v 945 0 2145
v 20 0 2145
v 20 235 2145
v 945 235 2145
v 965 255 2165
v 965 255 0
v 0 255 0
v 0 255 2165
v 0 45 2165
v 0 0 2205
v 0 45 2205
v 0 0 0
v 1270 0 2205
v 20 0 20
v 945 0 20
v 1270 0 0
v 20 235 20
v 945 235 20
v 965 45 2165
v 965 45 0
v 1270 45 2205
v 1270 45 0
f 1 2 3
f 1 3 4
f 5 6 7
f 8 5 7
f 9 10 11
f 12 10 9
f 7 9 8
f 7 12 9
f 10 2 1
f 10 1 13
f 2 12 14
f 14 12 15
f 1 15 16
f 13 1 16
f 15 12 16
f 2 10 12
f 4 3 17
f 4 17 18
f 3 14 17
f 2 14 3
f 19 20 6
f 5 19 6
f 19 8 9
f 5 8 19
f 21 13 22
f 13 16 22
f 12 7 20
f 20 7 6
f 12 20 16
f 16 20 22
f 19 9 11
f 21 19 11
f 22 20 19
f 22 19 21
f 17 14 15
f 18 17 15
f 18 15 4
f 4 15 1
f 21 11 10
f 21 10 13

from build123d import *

# Parameters (mm, degrees)
F1_DEPTH = 2165
F2_W     = 1270
F2_H     = 45
F3_DEPTH = 40
F4_W     = 925
F4_H     = 2125
F5_DEPTH = 235


with BuildPart() as f1:
    # F0 (on Top) → F1 (new body)
    with BuildSketch(Plane.XY):
        Polygon((0, 255), (0, 0), (1270, 0), (1270, 45), (965, 45), (965, 255), align=None)
    extrude(amount=F1_DEPTH)

    # F2 (on face) → F3 (join)
    with BuildSketch(Plane.XY.offset(2165)):
        with Locations((635, 22.5)):
            Rectangle(F2_W, F2_H)
    extrude(amount=F3_DEPTH)

    # F4 (on face) → F5 (cut)
    with BuildSketch(Plane.XZ):
        with Locations((482.5, 1082.5)):
            Rectangle(F4_W, F4_H)
    extrude(amount=-F5_DEPTH, mode=Mode.SUBTRACT)


solid = f1.part
